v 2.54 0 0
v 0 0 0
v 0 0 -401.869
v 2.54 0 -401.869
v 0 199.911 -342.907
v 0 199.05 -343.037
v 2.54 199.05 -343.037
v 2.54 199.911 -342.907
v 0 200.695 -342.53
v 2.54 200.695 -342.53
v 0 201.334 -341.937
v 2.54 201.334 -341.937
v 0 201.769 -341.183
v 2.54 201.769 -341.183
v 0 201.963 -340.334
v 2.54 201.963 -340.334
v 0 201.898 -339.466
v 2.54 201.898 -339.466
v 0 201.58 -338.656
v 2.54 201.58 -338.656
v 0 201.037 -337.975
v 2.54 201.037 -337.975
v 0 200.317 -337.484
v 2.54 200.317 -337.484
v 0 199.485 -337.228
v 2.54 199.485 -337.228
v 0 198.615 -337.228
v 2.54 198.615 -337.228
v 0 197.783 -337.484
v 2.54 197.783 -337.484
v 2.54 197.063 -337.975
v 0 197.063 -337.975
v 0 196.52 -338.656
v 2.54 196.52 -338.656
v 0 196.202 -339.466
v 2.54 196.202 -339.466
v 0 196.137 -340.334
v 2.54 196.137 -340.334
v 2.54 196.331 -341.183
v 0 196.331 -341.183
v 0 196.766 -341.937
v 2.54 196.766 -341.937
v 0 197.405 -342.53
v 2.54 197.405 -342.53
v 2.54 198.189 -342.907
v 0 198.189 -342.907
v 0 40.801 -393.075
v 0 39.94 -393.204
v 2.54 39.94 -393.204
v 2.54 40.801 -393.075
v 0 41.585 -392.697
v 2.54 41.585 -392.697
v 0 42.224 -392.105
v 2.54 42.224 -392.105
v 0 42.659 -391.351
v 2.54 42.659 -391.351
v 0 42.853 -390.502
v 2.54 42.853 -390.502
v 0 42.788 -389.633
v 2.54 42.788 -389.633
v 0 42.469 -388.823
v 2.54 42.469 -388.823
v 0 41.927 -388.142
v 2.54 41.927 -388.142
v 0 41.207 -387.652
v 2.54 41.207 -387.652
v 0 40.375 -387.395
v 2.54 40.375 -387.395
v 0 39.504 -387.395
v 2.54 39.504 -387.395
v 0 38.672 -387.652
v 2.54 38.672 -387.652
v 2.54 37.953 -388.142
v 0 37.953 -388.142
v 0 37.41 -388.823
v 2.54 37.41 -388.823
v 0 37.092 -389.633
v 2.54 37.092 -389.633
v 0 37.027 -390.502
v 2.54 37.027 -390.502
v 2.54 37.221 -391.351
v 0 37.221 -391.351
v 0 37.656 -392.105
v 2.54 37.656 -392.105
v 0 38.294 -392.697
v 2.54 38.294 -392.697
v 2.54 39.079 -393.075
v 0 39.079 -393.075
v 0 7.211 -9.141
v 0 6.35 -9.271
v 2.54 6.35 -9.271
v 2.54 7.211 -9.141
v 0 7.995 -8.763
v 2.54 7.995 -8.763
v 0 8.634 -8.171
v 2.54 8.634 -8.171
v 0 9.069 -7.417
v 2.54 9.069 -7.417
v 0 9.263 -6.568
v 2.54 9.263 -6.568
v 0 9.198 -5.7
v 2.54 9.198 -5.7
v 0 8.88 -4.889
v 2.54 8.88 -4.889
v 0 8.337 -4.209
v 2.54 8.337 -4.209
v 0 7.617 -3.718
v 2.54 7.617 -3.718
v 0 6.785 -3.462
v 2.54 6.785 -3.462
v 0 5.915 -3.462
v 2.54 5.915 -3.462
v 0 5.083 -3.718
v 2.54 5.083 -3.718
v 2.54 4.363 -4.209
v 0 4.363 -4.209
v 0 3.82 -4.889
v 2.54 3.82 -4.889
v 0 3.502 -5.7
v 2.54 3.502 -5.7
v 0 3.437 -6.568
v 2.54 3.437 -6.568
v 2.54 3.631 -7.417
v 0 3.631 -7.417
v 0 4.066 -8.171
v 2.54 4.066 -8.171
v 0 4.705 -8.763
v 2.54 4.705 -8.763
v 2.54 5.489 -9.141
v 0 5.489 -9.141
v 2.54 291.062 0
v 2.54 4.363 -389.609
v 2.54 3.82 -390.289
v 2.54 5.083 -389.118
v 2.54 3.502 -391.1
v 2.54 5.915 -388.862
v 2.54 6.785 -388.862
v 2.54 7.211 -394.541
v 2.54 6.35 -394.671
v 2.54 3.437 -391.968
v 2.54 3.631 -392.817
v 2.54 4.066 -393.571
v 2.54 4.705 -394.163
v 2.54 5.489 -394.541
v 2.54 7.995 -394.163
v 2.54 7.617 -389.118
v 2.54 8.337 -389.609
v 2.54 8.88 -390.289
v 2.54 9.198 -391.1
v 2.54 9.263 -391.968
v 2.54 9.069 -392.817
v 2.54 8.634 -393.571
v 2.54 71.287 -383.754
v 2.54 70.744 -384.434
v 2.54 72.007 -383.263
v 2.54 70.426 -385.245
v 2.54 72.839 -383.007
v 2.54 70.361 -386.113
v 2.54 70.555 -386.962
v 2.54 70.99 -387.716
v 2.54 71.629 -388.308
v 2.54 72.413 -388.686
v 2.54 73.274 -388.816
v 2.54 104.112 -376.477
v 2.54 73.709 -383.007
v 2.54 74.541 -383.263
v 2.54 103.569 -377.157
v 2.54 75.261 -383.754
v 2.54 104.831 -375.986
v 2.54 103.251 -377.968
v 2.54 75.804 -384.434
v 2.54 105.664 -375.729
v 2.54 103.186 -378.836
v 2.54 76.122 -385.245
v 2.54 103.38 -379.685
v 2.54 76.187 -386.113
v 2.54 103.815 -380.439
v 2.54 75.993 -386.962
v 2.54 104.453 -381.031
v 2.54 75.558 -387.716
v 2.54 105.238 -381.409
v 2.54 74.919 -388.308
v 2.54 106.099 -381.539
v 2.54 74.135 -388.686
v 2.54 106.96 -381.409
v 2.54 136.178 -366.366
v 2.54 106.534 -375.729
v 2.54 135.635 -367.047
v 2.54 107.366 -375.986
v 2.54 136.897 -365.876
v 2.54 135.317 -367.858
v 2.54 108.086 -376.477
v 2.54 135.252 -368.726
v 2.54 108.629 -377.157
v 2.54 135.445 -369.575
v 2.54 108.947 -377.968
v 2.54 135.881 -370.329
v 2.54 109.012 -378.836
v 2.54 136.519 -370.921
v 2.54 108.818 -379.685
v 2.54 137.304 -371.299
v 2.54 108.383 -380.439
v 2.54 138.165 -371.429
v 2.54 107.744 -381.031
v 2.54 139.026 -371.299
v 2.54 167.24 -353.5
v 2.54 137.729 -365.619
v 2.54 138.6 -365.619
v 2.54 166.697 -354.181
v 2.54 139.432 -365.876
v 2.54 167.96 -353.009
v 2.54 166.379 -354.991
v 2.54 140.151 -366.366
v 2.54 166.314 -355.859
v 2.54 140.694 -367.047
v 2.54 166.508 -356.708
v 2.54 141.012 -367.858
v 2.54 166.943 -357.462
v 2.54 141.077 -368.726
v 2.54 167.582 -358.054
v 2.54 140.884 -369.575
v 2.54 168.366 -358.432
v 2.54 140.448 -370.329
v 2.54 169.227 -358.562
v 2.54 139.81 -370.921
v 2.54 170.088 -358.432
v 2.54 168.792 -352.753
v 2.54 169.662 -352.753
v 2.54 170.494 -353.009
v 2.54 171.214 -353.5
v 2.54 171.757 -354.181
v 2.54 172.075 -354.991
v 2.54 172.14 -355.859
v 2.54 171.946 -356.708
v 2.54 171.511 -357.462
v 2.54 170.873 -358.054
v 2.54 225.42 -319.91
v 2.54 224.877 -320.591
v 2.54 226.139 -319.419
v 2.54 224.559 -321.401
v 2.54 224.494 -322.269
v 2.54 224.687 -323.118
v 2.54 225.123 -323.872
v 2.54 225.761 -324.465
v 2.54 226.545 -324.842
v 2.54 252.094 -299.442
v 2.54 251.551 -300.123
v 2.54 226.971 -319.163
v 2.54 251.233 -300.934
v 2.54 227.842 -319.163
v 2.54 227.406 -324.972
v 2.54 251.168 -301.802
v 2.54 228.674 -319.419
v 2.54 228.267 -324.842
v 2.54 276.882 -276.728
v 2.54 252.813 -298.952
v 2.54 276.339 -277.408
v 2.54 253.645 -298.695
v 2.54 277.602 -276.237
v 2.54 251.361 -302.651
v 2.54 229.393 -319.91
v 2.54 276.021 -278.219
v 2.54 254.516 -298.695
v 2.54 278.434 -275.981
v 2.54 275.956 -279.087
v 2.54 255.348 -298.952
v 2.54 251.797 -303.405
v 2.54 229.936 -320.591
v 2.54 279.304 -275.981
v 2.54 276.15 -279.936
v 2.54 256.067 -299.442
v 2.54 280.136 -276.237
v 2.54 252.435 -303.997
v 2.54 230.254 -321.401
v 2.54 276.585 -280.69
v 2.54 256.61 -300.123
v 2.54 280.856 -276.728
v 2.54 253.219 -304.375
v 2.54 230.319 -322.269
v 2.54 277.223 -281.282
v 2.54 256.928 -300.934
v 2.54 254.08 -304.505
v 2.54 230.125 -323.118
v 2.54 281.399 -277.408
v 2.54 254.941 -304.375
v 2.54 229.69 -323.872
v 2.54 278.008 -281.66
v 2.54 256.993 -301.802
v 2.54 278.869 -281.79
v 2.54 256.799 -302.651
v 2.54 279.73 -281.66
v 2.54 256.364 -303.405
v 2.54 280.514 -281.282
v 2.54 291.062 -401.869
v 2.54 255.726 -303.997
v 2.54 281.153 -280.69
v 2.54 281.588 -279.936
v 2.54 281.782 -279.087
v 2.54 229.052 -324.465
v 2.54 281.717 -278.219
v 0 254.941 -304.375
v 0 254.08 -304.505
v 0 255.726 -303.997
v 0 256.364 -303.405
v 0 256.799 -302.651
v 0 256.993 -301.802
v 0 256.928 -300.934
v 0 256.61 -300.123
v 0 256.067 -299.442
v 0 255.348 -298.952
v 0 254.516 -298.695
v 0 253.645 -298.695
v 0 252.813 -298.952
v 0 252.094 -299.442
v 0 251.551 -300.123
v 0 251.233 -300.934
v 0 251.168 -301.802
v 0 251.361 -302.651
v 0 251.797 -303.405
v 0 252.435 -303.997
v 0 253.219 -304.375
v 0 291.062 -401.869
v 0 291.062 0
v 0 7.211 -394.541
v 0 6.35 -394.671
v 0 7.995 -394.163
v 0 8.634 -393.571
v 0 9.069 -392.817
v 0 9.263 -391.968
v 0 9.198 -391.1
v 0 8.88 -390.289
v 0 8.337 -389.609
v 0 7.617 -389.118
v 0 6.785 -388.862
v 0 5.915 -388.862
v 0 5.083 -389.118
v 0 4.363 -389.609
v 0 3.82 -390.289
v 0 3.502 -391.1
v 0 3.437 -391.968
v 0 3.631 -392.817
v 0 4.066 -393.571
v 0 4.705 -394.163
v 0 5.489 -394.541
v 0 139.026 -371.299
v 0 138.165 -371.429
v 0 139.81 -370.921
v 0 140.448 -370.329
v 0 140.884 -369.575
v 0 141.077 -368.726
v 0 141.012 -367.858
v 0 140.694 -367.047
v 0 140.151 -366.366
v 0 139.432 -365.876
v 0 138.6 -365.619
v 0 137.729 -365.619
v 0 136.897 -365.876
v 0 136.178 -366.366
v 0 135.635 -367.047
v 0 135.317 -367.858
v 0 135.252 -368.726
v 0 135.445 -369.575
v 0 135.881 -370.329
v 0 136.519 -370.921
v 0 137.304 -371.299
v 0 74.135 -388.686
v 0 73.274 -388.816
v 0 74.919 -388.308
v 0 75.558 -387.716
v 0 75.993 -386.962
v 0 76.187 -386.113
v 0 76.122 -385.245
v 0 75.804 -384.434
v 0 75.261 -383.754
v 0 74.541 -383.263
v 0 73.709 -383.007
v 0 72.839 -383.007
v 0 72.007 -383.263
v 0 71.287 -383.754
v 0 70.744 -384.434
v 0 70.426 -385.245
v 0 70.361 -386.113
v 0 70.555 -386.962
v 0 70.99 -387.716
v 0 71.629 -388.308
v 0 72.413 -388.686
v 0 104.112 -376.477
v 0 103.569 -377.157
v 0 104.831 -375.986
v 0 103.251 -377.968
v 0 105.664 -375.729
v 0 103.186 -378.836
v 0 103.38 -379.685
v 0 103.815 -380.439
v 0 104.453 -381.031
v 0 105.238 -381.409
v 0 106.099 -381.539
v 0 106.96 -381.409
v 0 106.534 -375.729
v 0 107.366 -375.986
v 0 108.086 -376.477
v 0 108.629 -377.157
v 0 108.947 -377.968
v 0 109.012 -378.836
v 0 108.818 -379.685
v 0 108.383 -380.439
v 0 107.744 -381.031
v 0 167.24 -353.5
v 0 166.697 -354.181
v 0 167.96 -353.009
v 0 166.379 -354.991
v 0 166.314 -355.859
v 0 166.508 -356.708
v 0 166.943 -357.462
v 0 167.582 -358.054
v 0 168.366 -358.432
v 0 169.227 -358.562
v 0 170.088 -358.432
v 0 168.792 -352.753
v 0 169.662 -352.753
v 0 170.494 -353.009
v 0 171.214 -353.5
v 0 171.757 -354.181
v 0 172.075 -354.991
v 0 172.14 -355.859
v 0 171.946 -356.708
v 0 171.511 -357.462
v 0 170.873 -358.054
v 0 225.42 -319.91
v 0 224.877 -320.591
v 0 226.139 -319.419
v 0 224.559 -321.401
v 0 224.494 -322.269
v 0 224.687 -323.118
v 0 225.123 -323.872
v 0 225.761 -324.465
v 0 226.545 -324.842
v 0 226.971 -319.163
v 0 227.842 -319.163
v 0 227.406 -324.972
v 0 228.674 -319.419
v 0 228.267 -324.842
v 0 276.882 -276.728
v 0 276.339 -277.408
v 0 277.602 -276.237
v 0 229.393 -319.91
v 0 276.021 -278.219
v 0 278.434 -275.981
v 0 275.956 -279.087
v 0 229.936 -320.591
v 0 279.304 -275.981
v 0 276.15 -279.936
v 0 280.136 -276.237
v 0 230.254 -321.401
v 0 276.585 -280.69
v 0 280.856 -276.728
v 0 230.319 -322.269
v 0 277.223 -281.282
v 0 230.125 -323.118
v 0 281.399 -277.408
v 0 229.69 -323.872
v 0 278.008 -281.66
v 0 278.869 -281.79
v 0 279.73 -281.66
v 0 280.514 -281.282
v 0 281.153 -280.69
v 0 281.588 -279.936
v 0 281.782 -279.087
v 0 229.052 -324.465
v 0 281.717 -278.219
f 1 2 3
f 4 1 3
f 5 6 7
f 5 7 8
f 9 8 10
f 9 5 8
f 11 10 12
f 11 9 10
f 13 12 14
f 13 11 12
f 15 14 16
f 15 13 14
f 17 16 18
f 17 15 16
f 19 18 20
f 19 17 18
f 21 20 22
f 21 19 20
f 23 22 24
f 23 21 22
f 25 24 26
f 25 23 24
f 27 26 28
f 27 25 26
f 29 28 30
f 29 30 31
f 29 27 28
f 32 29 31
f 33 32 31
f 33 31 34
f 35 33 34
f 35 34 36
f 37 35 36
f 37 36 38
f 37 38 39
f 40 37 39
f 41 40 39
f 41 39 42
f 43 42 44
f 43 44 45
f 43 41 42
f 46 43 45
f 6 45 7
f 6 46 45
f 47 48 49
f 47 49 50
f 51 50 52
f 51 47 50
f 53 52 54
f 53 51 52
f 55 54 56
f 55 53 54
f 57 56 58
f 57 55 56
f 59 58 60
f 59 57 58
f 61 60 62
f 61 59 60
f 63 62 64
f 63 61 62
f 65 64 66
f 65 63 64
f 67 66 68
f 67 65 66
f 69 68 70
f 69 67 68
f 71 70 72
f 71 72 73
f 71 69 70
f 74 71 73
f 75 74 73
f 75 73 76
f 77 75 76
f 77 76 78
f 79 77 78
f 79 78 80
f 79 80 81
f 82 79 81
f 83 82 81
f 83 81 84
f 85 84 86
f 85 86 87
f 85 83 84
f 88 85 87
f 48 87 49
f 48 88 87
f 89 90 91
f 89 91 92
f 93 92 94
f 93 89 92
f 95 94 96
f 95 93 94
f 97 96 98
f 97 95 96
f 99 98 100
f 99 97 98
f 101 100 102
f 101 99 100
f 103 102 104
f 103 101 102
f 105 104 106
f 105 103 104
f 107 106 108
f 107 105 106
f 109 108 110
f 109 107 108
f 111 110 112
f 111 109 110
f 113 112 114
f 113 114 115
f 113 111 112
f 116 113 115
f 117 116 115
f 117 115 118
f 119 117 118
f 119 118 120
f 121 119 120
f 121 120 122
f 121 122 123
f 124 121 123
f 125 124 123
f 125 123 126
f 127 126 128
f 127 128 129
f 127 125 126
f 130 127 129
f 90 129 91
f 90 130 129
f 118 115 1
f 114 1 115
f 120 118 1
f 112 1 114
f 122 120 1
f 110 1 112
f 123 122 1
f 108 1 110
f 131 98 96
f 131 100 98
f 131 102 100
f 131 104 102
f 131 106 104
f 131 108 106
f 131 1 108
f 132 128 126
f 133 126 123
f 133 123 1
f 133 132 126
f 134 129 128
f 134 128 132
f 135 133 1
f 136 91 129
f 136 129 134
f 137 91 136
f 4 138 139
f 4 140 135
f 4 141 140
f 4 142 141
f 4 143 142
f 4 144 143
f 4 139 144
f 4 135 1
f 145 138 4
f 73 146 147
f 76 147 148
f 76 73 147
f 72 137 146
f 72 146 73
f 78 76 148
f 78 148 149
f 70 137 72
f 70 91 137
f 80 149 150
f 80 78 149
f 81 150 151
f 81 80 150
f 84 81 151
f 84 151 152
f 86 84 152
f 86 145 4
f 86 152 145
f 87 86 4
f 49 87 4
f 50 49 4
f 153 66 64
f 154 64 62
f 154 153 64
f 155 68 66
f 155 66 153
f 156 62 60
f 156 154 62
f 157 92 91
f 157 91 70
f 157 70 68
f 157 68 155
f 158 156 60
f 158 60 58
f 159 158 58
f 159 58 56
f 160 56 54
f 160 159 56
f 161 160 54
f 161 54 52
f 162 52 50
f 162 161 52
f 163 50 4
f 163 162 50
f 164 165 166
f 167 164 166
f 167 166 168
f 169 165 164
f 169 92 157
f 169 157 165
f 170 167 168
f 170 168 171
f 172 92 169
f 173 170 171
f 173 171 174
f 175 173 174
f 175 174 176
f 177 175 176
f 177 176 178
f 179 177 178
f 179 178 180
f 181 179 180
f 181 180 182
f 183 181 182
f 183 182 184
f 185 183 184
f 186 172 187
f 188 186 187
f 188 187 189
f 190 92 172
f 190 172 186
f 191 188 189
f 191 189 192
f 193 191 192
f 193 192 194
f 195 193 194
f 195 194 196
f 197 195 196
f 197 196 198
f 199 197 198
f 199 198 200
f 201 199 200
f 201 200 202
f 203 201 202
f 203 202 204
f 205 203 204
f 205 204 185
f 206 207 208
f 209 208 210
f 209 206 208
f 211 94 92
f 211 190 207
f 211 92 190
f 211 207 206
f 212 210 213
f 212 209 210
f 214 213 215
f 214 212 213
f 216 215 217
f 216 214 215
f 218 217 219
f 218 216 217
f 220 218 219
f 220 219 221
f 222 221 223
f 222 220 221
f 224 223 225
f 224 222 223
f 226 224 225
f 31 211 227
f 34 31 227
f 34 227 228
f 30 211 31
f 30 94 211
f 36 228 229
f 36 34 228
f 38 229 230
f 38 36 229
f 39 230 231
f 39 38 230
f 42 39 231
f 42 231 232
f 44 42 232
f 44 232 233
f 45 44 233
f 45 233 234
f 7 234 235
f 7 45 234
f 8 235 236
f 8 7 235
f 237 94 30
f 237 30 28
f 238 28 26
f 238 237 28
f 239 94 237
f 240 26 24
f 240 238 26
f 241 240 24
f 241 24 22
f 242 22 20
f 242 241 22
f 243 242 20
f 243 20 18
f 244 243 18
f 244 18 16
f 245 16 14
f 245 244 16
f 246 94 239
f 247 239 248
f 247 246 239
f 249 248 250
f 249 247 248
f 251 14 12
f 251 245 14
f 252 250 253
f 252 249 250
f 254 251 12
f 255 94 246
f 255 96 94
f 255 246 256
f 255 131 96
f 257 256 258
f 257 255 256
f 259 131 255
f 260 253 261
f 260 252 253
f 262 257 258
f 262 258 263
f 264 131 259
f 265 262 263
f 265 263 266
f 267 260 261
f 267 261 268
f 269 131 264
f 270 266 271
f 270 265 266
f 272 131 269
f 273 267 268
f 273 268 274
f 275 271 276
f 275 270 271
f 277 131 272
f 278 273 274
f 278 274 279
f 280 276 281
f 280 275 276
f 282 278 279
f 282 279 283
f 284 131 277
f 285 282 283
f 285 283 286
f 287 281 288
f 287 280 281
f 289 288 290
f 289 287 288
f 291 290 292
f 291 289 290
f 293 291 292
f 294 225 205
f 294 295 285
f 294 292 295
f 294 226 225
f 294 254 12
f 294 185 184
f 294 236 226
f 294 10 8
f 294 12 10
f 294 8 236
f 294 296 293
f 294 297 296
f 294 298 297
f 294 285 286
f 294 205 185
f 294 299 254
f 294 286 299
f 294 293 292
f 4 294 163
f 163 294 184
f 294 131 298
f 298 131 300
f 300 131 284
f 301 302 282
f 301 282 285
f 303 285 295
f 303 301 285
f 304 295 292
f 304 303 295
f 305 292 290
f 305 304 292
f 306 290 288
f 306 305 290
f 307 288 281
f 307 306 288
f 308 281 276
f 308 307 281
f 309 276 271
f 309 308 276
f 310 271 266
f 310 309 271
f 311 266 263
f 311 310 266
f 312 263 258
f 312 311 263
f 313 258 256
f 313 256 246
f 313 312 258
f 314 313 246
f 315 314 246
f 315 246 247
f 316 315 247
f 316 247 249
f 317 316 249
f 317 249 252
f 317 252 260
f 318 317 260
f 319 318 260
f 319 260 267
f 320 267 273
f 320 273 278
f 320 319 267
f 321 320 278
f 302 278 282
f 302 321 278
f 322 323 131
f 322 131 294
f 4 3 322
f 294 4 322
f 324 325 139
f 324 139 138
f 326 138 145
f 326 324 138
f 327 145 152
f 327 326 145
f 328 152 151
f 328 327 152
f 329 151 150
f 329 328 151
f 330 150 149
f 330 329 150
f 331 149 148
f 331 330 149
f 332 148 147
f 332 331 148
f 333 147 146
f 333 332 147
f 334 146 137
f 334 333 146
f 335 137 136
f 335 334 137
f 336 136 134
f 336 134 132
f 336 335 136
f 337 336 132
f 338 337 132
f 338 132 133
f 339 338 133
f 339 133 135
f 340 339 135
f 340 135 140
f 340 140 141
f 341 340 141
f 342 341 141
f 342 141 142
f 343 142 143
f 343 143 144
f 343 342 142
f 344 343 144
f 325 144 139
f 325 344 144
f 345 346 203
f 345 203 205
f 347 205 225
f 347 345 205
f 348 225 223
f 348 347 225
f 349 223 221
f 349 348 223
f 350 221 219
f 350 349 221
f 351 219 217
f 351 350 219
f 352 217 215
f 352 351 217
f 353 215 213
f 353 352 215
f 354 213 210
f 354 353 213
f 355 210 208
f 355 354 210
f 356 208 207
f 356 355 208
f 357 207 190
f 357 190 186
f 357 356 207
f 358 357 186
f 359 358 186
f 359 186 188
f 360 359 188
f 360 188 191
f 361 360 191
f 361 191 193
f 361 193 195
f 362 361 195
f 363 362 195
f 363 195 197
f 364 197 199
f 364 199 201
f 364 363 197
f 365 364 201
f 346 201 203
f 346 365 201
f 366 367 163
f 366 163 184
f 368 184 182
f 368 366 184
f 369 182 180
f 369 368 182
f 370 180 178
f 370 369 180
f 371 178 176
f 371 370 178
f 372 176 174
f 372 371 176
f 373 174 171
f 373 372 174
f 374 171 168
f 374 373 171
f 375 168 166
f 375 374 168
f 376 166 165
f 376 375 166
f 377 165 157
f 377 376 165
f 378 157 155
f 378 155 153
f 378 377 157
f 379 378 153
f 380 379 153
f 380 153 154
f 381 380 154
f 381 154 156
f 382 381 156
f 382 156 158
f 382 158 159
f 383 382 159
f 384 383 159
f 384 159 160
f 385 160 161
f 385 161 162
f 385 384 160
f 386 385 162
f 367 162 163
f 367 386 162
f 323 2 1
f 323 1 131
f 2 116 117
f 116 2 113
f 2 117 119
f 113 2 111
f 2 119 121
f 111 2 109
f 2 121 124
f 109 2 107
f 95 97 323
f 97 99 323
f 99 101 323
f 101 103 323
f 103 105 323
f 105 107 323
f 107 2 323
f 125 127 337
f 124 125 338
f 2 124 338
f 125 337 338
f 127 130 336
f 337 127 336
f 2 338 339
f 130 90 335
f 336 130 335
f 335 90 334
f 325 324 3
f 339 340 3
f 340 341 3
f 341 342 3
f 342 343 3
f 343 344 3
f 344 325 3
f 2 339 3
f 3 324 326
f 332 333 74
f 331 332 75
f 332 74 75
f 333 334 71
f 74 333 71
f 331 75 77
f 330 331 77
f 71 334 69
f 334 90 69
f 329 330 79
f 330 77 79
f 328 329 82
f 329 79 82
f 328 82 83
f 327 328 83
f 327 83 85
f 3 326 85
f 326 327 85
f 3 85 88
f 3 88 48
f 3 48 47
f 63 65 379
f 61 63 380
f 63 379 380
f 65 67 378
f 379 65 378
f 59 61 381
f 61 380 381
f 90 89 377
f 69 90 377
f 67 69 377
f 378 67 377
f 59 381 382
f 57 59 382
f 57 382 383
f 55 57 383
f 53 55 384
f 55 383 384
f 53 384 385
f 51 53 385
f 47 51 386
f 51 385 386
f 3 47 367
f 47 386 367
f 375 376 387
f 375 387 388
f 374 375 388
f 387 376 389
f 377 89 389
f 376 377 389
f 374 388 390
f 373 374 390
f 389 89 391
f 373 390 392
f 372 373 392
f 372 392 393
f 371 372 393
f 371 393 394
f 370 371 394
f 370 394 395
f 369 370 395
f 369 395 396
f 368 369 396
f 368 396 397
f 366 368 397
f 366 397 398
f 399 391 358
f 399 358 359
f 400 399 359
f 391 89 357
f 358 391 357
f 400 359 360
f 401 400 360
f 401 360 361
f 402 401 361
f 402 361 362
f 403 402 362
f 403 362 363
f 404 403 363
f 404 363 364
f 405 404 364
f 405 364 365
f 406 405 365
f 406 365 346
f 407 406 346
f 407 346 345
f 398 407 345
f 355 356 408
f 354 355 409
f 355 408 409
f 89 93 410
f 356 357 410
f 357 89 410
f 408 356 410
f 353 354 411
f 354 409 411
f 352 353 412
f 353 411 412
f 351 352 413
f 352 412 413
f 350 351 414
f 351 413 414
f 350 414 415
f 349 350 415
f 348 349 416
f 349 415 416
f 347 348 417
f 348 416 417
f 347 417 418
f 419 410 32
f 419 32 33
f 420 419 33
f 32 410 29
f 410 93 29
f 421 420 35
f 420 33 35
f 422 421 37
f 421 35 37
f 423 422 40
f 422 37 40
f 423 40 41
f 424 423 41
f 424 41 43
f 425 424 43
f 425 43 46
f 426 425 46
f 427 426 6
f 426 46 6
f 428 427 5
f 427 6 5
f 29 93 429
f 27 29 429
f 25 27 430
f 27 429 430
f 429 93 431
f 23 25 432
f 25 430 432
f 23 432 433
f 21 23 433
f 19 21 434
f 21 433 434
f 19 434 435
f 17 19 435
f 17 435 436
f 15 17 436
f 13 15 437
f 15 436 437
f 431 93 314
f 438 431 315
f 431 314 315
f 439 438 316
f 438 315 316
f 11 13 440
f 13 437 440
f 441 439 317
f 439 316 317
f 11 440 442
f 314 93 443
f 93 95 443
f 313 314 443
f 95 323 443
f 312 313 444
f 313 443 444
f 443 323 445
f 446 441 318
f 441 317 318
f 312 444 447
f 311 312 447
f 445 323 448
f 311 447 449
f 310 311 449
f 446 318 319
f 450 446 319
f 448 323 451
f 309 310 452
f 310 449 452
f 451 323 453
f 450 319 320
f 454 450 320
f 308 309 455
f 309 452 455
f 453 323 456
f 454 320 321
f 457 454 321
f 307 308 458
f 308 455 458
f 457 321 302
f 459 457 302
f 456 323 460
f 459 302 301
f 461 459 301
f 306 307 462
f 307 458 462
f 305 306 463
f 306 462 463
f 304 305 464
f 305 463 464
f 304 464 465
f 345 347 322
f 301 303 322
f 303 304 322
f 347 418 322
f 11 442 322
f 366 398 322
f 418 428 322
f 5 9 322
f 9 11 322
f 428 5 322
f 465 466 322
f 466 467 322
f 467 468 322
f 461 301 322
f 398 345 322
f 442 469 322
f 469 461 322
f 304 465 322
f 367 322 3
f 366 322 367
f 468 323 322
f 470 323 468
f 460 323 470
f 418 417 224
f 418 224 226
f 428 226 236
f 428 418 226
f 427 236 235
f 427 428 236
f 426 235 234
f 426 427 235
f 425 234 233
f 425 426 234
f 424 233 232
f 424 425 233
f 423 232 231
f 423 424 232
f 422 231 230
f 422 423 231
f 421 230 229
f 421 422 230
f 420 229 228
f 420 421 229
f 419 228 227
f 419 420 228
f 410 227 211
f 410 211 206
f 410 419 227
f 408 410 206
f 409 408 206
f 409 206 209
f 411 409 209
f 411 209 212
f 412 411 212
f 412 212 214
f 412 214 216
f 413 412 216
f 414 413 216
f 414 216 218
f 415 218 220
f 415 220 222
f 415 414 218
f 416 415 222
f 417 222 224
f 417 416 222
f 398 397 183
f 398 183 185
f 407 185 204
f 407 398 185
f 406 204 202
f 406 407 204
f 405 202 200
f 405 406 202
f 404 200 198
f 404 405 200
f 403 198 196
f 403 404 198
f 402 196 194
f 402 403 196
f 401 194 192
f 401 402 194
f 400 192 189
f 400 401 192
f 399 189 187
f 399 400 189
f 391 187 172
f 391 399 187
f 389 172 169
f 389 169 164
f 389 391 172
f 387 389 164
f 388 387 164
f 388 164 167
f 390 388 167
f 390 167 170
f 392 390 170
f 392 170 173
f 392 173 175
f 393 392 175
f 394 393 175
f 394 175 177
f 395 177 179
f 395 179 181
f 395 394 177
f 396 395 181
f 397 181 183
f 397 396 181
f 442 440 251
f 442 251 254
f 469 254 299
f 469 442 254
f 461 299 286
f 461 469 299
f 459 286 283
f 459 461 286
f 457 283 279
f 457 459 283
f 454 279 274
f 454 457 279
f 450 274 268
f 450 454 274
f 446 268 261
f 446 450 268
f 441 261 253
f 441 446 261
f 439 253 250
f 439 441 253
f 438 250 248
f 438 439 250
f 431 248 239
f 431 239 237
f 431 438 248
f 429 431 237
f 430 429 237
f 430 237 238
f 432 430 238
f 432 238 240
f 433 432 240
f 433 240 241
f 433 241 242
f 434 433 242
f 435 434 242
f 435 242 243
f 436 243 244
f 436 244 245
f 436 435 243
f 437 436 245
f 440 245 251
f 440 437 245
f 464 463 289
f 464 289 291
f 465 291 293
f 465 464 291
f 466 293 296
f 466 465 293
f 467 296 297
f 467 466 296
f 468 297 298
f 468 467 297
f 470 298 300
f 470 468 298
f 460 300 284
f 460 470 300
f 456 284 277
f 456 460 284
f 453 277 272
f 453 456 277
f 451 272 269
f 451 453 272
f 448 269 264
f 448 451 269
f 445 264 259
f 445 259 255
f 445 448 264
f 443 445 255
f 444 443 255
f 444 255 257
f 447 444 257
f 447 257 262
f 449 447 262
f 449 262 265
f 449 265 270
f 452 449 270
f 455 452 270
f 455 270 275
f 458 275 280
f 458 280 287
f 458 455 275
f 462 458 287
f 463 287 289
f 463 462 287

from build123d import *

# Parameters (mm, degrees)
SKETCH1_W           = 401.869209935
SKETCH1_H           = 291.062175581
SKETCH1_R           = 2.921
BOSS_EXTRUDE1_DEPTH = 2.54


with BuildPart() as part:
    # Sketch1 → Boss-Extrude1 (new body)
    with BuildSketch(Plane(origin=(0, 0, 0), x_dir=(0, 0, -1), z_dir=(1, 0, 0))):
        with Locations((200.934604968, 145.531087791)):
            Rectangle(SKETCH1_W, SKETCH1_H)
        with Locations((6.35, 6.35)):
            Circle(SKETCH1_R, mode=Mode.SUBTRACT)
        with Locations((391.7499912, 6.35)):
            Circle(SKETCH1_R, mode=Mode.SUBTRACT)
        with Locations((390.283427878, 39.939822488)):
            Circle(SKETCH1_R, mode=Mode.SUBTRACT)
        with Locations((385.894899345, 73.274006145)):
            Circle(SKETCH1_R, mode=Mode.SUBTRACT)
        with Locations((378.617804952, 106.098857705)):
            Circle(SKETCH1_R, mode=Mode.SUBTRACT)
        with Locations((368.507527782, 138.164560228)):
            Circle(SKETCH1_R, mode=Mode.SUBTRACT)
        with Locations((355.641013148, 169.227074356)):
            Circle(SKETCH1_R, mode=Mode.SUBTRACT)
        with Locations((340.116182997, 199.0499956)):
            Circle(SKETCH1_R, mode=Mode.SUBTRACT)
        with Locations((322.05119066, 227.406353522)):
            Circle(SKETCH1_R, mode=Mode.SUBTRACT)
        with Locations((301.583521637, 254.080339117)):
            Circle(SKETCH1_R, mode=Mode.SUBTRACT)
        with Locations((278.868947247, 278.868947247)):
            Circle(SKETCH1_R, mode=Mode.SUBTRACT)
    extrude(amount=BOSS_EXTRUDE1_DEPTH)


solid = part.part
